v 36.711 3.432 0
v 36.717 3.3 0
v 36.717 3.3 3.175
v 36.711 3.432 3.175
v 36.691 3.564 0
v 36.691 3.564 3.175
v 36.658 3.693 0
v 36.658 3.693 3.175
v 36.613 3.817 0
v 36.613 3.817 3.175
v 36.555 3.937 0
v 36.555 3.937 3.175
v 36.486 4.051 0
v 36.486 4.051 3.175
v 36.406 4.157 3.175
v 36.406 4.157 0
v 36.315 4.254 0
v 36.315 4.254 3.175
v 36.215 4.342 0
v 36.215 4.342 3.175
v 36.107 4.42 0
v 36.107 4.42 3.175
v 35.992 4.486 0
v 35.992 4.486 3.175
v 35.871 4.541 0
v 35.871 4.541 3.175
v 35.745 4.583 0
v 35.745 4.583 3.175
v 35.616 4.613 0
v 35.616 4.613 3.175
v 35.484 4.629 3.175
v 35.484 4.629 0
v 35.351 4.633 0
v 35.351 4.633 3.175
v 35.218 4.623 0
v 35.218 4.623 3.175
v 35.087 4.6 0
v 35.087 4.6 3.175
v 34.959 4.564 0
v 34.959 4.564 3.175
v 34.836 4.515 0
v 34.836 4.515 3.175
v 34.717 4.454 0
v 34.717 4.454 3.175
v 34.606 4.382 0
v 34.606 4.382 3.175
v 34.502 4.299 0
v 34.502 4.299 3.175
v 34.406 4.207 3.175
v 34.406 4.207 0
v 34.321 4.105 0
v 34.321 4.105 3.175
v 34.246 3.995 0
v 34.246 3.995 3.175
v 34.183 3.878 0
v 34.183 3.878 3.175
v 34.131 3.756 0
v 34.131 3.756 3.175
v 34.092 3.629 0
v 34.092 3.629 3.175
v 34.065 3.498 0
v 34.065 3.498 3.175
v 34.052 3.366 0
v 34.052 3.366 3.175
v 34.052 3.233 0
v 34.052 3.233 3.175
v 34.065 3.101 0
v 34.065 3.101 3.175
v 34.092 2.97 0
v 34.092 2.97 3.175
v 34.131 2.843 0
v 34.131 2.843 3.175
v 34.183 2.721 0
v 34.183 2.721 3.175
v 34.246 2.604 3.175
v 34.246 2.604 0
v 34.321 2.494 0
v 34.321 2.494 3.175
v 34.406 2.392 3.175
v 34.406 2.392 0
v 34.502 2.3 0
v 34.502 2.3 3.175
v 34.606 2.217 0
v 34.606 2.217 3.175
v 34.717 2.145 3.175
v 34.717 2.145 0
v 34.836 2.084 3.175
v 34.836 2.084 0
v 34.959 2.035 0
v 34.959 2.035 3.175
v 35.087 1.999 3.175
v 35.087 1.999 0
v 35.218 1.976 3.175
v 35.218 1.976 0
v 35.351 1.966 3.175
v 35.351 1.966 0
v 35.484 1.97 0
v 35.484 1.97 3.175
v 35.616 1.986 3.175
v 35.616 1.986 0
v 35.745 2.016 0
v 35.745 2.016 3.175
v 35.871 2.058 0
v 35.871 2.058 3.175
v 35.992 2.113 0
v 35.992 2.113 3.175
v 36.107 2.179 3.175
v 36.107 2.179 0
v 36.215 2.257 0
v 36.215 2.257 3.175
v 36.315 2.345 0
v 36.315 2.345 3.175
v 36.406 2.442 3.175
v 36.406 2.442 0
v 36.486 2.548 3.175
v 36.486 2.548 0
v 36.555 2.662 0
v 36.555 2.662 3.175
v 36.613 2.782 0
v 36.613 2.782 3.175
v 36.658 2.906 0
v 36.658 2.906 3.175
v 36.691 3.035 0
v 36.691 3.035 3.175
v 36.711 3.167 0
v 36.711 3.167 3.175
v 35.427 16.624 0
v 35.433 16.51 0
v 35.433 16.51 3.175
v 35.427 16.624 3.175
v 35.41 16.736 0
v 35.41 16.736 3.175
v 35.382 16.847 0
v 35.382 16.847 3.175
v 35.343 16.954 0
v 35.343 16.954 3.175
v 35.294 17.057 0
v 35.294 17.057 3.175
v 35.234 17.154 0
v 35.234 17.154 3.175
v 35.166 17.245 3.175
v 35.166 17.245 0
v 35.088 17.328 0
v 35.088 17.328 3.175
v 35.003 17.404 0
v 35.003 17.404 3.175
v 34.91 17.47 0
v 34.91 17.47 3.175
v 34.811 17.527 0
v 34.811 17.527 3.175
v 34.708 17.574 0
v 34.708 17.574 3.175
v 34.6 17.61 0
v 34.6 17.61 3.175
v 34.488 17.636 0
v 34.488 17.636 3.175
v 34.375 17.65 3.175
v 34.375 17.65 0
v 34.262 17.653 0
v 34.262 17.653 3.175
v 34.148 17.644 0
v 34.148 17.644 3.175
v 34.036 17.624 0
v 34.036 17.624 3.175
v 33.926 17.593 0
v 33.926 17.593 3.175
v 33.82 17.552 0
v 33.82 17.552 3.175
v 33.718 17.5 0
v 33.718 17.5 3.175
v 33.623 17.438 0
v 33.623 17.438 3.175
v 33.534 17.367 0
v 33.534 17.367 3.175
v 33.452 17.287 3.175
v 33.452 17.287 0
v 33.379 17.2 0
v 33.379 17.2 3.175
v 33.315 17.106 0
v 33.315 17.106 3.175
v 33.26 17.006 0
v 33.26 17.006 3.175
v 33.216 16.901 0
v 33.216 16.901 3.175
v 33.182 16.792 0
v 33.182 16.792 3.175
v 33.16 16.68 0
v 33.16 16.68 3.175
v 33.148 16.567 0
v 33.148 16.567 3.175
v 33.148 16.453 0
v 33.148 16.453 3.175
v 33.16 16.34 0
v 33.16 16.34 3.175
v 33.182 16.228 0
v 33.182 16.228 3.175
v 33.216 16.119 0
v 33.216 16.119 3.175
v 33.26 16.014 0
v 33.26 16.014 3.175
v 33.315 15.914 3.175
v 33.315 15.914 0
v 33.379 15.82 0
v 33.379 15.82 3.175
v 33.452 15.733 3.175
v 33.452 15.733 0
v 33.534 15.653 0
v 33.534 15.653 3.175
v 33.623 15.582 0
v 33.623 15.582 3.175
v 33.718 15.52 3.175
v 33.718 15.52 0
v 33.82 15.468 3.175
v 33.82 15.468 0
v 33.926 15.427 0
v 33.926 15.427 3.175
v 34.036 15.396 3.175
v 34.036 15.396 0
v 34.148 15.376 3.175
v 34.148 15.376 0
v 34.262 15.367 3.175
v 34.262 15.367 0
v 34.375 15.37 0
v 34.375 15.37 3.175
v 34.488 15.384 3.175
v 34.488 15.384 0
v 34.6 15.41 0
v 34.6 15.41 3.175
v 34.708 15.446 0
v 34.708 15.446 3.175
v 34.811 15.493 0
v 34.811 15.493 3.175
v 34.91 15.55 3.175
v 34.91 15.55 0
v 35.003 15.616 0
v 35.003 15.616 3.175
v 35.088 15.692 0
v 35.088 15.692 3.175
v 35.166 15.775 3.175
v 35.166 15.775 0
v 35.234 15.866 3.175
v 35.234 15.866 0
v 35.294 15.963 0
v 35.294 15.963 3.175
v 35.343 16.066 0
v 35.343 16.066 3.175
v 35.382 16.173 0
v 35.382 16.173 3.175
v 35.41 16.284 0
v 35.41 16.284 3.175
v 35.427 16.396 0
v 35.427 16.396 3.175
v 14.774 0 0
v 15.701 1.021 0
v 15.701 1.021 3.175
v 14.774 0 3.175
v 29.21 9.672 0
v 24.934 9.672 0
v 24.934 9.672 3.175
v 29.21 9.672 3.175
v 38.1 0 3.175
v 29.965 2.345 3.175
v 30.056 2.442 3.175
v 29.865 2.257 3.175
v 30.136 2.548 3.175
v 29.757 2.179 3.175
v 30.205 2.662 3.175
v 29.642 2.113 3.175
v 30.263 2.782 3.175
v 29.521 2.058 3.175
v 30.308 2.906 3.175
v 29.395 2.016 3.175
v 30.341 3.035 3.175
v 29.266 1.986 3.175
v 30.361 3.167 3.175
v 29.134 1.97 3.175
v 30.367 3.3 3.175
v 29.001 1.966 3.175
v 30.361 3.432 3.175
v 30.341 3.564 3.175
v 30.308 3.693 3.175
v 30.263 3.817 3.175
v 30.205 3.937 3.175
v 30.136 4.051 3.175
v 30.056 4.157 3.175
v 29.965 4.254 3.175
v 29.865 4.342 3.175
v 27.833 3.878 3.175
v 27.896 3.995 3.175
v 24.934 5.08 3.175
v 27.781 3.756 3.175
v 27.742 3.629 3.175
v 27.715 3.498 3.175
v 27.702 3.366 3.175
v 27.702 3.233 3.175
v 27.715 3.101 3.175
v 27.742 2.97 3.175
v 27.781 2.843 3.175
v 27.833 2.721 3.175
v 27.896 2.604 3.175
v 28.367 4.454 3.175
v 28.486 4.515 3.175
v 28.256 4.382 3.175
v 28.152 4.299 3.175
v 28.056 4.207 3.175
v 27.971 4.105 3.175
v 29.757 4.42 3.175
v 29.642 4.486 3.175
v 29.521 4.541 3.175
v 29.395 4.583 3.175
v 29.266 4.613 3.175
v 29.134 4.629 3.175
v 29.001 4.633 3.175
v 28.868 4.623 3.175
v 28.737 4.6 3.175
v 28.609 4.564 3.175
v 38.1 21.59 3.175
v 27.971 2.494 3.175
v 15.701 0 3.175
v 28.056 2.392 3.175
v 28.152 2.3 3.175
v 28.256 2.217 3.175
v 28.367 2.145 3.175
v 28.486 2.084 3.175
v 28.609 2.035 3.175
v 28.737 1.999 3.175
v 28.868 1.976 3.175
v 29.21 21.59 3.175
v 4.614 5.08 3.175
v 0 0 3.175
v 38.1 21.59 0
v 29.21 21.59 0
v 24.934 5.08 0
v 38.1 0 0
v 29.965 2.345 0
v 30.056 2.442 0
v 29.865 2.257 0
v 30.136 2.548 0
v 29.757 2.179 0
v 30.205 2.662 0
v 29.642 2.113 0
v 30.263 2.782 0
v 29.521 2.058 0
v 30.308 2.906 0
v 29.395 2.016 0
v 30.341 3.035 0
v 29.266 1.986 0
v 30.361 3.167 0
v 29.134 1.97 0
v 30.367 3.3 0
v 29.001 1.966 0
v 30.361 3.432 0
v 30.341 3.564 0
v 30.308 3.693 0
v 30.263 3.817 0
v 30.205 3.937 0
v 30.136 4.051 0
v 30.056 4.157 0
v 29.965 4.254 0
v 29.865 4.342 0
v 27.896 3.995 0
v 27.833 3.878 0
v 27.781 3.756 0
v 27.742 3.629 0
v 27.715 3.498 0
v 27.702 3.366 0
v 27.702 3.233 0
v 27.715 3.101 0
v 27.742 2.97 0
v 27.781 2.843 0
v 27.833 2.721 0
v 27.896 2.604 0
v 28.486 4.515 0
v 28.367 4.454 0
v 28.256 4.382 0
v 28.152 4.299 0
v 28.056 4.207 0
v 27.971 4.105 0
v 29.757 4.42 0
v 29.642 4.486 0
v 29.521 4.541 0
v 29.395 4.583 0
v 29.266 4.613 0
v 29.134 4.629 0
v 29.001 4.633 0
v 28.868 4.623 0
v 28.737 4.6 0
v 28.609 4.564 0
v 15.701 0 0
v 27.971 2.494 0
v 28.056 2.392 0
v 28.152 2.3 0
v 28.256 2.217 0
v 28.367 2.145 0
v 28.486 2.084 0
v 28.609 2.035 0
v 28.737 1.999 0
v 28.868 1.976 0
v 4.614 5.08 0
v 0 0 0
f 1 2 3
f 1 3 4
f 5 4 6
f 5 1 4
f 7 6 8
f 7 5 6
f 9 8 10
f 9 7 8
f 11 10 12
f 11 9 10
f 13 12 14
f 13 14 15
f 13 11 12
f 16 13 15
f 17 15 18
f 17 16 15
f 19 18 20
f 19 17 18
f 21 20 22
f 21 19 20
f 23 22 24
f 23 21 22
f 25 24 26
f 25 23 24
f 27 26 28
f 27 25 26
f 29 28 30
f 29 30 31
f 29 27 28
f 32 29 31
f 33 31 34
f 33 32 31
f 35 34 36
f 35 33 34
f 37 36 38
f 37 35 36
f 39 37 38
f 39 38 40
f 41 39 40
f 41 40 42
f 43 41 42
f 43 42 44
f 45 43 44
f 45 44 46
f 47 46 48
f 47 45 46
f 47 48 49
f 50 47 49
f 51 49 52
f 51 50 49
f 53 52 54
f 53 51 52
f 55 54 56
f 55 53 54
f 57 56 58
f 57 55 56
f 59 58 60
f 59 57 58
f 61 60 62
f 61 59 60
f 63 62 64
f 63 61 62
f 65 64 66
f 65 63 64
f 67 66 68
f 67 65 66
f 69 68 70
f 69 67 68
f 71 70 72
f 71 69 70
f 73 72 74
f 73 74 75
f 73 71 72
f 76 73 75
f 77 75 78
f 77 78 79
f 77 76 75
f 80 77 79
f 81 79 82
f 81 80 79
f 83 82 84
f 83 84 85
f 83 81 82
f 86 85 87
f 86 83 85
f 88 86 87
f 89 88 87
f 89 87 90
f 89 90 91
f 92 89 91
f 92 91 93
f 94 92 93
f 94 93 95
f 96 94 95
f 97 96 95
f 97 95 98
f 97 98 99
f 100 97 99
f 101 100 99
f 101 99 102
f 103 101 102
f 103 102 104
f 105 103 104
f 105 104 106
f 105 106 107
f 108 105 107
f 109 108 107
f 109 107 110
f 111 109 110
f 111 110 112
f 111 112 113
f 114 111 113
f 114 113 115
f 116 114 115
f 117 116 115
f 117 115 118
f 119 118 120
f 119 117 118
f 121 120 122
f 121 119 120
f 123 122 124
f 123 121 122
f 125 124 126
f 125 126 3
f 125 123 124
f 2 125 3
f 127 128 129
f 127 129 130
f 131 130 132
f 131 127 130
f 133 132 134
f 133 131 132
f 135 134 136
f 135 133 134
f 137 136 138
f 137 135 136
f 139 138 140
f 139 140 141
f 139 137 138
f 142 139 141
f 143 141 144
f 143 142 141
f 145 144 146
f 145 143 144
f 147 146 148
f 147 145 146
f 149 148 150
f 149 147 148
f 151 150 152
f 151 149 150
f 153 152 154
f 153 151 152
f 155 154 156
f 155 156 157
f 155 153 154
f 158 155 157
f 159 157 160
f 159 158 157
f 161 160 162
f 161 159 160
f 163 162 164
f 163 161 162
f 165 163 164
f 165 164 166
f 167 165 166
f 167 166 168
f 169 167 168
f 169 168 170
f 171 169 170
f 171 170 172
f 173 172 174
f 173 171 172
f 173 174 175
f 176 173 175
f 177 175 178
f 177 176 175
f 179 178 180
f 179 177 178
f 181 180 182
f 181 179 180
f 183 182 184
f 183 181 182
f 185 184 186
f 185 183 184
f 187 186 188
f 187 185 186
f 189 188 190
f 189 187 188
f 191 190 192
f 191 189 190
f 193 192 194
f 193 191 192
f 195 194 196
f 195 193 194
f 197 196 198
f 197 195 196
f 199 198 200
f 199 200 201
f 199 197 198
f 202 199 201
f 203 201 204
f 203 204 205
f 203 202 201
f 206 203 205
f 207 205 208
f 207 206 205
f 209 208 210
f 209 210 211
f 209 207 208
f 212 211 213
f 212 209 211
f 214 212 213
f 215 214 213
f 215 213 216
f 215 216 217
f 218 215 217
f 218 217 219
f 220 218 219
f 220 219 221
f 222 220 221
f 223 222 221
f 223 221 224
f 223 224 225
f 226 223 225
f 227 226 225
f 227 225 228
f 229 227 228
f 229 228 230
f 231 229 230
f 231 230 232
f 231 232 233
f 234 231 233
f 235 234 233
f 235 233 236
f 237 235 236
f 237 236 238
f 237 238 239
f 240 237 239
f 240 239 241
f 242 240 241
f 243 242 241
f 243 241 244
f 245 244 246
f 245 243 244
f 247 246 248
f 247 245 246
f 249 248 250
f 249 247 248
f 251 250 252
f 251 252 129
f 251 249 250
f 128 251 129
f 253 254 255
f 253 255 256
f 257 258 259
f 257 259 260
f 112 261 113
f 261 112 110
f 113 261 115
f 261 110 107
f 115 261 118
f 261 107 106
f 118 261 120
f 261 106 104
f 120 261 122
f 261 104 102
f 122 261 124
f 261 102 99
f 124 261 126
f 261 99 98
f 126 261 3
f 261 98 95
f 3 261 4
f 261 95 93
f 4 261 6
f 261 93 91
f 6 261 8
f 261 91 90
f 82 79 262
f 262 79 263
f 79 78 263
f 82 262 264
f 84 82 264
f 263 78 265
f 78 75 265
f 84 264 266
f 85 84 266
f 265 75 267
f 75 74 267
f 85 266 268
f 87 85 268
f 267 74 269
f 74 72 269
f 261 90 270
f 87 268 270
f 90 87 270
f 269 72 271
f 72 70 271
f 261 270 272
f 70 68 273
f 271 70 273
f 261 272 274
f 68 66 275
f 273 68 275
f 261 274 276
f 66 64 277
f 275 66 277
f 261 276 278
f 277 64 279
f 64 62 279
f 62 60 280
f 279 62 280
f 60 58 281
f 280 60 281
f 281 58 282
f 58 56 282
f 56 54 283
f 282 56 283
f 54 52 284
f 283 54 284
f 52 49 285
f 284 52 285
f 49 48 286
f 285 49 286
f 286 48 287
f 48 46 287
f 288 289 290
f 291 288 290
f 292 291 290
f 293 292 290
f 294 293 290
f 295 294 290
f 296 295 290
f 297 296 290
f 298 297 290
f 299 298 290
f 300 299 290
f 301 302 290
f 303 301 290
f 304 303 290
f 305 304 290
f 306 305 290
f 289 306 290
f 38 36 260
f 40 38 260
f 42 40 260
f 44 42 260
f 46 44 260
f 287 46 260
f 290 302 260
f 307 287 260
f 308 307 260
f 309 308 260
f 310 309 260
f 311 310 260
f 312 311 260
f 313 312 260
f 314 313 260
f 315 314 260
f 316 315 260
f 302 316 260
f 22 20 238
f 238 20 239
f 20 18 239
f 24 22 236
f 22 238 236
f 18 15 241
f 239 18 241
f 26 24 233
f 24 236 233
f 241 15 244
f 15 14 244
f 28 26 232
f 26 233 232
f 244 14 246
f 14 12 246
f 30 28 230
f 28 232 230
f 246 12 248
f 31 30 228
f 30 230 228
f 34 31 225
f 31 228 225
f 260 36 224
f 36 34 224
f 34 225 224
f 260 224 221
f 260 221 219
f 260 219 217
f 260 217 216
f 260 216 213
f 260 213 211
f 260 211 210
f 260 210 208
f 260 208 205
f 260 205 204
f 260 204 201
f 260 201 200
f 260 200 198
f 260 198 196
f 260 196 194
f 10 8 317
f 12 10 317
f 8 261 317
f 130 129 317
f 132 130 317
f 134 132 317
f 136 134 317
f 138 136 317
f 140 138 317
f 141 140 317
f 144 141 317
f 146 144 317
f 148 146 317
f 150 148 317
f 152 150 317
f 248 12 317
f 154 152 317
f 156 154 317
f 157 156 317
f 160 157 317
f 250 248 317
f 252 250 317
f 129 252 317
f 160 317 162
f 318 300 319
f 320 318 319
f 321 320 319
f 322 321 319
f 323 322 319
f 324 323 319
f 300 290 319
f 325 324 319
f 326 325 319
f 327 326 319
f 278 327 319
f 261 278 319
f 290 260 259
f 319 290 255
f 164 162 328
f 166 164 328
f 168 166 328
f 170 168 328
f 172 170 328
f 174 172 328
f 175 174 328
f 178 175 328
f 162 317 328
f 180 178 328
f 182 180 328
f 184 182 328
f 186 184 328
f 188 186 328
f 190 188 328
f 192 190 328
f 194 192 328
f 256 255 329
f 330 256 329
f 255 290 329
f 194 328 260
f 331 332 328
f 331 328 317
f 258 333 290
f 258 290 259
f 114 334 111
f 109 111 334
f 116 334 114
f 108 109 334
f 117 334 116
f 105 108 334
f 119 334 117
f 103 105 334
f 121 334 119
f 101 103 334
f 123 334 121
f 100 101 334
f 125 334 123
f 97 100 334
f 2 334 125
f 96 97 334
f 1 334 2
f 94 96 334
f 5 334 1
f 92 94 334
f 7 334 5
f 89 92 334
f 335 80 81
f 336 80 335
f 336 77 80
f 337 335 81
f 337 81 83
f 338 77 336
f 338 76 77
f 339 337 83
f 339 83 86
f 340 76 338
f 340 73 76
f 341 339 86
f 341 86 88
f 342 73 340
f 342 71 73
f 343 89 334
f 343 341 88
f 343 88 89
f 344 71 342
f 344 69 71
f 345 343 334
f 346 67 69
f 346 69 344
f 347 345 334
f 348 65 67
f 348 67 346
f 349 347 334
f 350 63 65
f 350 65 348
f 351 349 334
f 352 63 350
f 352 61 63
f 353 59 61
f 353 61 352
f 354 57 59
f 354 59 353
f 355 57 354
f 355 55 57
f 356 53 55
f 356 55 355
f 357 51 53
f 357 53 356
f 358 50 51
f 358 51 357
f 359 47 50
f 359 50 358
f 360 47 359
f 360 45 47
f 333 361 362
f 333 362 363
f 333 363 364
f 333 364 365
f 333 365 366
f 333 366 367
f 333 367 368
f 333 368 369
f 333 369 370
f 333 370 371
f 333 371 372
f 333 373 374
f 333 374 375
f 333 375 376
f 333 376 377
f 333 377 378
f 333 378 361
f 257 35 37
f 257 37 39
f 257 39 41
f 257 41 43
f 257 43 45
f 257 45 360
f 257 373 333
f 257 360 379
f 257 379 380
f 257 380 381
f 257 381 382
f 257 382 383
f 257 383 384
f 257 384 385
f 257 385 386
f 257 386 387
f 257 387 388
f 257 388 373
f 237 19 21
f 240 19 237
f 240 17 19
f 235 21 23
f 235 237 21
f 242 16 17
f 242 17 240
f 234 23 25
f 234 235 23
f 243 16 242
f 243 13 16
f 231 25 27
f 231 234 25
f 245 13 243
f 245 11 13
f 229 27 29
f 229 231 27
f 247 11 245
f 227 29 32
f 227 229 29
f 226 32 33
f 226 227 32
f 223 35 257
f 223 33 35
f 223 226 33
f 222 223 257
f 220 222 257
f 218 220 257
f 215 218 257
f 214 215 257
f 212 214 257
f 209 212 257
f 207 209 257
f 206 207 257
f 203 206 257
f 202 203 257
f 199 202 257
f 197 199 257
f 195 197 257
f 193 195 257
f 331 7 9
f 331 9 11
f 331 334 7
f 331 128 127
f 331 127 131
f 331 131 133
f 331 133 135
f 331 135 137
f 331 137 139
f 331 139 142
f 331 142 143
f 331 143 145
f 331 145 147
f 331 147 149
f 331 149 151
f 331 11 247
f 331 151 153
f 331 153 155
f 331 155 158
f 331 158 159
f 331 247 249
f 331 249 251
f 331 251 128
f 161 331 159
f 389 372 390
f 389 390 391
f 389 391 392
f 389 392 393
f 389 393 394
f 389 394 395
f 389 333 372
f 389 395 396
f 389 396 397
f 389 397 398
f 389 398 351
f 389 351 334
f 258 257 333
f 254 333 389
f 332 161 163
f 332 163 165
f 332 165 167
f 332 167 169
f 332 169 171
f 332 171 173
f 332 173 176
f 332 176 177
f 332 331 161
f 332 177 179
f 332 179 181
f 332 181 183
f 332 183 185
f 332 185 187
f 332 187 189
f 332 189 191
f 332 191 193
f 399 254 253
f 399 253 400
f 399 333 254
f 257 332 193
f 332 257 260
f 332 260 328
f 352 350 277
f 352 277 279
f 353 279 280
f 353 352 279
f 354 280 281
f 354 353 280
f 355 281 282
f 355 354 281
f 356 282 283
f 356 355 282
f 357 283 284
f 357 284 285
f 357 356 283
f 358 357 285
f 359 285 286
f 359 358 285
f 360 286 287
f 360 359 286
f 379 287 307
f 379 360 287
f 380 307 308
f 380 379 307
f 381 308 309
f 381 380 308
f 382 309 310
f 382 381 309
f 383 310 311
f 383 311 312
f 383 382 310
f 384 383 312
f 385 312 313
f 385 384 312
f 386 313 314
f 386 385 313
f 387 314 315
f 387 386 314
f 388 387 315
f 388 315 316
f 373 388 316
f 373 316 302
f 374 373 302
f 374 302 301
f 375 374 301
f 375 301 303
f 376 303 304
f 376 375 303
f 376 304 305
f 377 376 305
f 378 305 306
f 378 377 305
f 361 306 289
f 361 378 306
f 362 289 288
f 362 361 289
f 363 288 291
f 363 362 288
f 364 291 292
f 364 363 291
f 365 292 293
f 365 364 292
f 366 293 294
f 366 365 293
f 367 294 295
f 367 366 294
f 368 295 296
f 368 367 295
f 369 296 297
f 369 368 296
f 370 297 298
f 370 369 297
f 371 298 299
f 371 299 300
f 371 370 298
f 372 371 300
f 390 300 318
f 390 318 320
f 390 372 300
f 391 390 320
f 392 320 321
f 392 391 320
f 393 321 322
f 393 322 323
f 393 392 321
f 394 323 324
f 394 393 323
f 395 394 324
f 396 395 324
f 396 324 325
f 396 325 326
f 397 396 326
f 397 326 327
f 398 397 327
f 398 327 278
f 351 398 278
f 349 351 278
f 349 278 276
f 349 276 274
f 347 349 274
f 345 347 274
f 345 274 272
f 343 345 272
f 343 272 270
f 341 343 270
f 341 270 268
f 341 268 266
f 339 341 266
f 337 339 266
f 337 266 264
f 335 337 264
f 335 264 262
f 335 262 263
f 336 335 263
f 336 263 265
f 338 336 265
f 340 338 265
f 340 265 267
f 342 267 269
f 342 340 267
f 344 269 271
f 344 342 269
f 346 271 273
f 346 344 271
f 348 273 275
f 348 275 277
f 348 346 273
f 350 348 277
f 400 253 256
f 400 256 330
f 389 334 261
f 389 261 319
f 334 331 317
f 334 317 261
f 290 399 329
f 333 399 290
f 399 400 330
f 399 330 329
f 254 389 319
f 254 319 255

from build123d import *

# Parameters (mm, degrees)
SKETCH1_R           = 1.3335
SKETCH1_R_2         = 1.143
BOSS_EXTRUDE1_DEPTH = 3.175


with BuildPart() as part:
    # Sketch1 → Boss-Extrude1 (new body)
    with BuildSketch(Plane.XY):
        Polygon((0, 0), (4.613655526, 5.08), (24.933655526, 5.08), (24.933655526, 9.671782949), (29.21, 9.671782949), (29.21, 21.59), (38.1, 21.59), (38.1, 0), (15.700557681, 0), (15.700557681, 1.020592656), (14.773655526, 0), align=None)
        with Locations((29.033993158, 3.299509856)):
            Circle(SKETCH1_R, mode=Mode.SUBTRACT)
        with Locations((35.383993158, 3.299509856)):
            Circle(SKETCH1_R, mode=Mode.SUBTRACT)
        with Locations((34.29, 16.51)):
            Circle(SKETCH1_R_2, mode=Mode.SUBTRACT)
    extrude(amount=BOSS_EXTRUDE1_DEPTH)


solid = part.part
